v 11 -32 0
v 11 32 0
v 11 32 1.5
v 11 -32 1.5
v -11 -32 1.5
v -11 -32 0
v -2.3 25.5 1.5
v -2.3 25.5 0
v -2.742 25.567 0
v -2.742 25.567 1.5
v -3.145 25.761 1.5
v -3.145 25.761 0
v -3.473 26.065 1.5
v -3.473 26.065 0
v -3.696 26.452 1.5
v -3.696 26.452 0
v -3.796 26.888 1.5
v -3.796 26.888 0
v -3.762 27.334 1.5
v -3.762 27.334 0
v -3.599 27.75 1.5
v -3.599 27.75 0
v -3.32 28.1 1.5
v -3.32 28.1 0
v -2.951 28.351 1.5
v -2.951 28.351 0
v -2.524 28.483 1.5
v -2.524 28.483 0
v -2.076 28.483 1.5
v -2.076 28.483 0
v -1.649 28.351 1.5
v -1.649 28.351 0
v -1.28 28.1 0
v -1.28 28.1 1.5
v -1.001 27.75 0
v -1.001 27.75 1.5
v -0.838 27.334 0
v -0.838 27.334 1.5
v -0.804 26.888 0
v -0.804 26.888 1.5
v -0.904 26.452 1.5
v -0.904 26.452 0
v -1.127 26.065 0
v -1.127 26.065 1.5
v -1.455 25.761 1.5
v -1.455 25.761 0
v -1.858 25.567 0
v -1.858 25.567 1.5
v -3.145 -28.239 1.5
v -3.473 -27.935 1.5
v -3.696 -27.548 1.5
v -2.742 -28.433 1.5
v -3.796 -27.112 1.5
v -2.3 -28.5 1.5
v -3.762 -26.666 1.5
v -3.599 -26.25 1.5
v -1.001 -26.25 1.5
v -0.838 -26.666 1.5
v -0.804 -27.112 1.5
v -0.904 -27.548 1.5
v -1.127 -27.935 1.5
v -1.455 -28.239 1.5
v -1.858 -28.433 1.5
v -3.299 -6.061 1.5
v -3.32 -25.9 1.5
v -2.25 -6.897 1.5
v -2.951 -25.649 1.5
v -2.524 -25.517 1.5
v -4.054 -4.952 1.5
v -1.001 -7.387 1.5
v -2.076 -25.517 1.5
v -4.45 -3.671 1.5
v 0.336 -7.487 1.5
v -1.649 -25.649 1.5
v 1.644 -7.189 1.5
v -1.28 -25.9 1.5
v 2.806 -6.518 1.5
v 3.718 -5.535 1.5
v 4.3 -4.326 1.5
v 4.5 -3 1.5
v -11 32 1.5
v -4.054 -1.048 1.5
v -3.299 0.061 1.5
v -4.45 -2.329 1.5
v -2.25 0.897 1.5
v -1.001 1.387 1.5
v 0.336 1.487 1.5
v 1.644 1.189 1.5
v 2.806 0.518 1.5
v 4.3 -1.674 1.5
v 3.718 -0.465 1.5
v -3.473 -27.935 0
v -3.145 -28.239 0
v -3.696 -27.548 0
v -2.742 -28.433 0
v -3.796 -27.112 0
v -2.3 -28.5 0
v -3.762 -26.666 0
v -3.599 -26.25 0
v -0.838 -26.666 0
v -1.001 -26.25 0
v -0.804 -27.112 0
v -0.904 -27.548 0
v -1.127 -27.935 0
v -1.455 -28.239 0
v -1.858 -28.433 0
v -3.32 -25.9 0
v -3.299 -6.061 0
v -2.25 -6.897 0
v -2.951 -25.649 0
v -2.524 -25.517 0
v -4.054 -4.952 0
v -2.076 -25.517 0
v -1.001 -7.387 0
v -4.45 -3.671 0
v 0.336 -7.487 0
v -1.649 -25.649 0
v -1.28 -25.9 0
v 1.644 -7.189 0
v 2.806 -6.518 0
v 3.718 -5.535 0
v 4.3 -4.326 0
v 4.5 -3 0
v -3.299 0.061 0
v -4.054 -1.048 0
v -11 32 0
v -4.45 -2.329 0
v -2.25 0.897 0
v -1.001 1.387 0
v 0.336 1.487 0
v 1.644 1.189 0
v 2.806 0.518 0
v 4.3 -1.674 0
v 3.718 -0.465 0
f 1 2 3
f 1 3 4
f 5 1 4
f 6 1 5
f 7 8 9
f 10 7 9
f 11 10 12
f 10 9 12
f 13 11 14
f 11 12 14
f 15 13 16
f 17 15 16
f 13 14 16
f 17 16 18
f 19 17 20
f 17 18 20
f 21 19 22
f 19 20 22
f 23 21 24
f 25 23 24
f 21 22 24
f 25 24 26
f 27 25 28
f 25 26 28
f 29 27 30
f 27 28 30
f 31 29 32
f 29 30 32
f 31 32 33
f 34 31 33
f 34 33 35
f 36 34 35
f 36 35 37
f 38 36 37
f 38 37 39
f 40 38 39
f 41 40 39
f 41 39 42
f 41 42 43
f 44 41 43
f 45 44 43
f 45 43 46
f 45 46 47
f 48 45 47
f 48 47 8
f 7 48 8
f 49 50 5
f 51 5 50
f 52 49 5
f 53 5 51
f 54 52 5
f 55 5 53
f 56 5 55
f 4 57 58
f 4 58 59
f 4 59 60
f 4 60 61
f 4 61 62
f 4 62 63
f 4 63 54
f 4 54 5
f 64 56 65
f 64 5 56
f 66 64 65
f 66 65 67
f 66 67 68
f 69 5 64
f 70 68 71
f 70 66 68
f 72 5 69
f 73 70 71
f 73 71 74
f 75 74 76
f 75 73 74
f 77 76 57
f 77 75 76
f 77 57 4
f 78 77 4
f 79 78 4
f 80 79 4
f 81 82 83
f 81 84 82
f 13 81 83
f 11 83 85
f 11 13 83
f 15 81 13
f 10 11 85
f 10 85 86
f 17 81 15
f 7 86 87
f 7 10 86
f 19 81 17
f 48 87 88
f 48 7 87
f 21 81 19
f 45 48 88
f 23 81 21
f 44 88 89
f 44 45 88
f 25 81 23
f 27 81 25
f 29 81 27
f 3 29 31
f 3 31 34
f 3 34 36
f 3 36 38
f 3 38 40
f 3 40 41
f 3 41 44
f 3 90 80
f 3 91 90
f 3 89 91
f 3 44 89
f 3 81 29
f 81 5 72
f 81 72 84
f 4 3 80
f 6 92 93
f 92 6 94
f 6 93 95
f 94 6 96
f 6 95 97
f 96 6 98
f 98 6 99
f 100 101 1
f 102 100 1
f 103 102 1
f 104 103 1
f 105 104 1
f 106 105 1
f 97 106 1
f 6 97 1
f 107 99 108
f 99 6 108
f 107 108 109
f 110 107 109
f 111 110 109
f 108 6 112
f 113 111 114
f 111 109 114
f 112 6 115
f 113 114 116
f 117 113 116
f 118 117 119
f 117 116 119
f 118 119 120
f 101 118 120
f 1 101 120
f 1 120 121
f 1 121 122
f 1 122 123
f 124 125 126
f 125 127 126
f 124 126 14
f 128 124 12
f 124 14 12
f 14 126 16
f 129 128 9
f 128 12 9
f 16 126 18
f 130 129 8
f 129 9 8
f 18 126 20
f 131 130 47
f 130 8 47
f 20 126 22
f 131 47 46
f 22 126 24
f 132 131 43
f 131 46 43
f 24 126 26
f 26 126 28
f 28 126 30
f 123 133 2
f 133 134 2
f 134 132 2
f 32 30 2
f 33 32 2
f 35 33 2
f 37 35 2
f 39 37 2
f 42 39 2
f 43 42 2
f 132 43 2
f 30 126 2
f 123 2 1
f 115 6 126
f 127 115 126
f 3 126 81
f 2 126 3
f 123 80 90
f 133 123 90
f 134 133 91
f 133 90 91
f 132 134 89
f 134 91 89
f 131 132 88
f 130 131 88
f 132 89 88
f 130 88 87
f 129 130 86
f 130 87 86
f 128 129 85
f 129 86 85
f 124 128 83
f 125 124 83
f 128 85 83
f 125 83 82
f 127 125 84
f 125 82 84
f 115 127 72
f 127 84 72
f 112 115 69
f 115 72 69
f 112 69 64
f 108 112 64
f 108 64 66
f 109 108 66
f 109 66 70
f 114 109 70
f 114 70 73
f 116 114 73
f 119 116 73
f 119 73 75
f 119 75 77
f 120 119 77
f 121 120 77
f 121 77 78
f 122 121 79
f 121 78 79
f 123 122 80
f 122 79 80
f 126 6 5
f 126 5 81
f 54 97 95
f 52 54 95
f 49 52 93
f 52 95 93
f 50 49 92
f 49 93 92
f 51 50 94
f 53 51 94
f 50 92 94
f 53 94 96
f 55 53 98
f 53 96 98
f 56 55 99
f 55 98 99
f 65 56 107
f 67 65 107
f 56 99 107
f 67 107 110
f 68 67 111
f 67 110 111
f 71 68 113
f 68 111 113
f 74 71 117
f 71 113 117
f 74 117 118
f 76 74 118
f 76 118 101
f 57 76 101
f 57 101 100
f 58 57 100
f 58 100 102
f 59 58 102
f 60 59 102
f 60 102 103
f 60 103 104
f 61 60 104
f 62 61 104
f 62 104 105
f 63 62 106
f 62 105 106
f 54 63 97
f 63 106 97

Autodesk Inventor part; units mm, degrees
ref_plane "YZ Plane" through (0, 0, 0) normal (1, 0, 0) x (0, 1, 0)
ref_plane "XZ Plane" through (0, 0, 0) normal (0, 1, 0) x (-1, 0, 0)
ref_plane "XY Plane" through (0, 0, 0) normal (0, 0, 1) x (1, 0, 0)
sketch "スケッチ1" plane through (0, 0, 0) normal (0, 0, 1) x (1, 0, 0)
  line L0 (11, -32) -> (-11, -32)
  line L1 (-11, -32) -> (-11, 32)
  line L2 (-11, 32) -> (11, 32)
  line L3 (11, 32) -> (11, -32)
  line L4 (11, -32) -> (-11, 32) construction
  line L5 (-11, -32) -> (11, 32) construction
  point P0 (0, 0)
  dimension "d0" = 22
  dimension "d1" = 64
extrude "押し出し1" add sketch "スケッチ1" along normal blind 1.5
sketch "スケッチ2" plane through (0, 0, 1.5) normal (0, 0, 1) x (1, 0, 0)
  line L0 (-11, 32) -> (-11, -32) projected
  line L1 (11, 32) -> (-11, 32) projected
  line L2 (-11, -32) -> (11, -32) projected
  point P0 (0, 0)
  point P1 (-2.3, 27)
  point P2 (-2.3, -27)
  dimension "d4" = 8.7
  dimension "d5" = 5
  dimension "d6" = 5
hole "穴1" at (-2.3, 27, 1.5) at (-2.3, -27, 1.5) direction (0, 0, -1) diameter 3 end through all
sketch "スケッチ3" plane through (0, 0, 1.5) normal (0, 0, 1) x (1, 0, 0)
  circle A0 centre (0, -3) radius 4.5
  line L0 (11, 32) -> (-11, 32) projected
  point P0 (0, 0)
  dimension "d14" = 35
  dimension "d15" = 9
extrude "押し出し2" cut sketch "スケッチ3" against normal blind 1.5
properties part number "pcb_base" material "アルミニウム 6061"
